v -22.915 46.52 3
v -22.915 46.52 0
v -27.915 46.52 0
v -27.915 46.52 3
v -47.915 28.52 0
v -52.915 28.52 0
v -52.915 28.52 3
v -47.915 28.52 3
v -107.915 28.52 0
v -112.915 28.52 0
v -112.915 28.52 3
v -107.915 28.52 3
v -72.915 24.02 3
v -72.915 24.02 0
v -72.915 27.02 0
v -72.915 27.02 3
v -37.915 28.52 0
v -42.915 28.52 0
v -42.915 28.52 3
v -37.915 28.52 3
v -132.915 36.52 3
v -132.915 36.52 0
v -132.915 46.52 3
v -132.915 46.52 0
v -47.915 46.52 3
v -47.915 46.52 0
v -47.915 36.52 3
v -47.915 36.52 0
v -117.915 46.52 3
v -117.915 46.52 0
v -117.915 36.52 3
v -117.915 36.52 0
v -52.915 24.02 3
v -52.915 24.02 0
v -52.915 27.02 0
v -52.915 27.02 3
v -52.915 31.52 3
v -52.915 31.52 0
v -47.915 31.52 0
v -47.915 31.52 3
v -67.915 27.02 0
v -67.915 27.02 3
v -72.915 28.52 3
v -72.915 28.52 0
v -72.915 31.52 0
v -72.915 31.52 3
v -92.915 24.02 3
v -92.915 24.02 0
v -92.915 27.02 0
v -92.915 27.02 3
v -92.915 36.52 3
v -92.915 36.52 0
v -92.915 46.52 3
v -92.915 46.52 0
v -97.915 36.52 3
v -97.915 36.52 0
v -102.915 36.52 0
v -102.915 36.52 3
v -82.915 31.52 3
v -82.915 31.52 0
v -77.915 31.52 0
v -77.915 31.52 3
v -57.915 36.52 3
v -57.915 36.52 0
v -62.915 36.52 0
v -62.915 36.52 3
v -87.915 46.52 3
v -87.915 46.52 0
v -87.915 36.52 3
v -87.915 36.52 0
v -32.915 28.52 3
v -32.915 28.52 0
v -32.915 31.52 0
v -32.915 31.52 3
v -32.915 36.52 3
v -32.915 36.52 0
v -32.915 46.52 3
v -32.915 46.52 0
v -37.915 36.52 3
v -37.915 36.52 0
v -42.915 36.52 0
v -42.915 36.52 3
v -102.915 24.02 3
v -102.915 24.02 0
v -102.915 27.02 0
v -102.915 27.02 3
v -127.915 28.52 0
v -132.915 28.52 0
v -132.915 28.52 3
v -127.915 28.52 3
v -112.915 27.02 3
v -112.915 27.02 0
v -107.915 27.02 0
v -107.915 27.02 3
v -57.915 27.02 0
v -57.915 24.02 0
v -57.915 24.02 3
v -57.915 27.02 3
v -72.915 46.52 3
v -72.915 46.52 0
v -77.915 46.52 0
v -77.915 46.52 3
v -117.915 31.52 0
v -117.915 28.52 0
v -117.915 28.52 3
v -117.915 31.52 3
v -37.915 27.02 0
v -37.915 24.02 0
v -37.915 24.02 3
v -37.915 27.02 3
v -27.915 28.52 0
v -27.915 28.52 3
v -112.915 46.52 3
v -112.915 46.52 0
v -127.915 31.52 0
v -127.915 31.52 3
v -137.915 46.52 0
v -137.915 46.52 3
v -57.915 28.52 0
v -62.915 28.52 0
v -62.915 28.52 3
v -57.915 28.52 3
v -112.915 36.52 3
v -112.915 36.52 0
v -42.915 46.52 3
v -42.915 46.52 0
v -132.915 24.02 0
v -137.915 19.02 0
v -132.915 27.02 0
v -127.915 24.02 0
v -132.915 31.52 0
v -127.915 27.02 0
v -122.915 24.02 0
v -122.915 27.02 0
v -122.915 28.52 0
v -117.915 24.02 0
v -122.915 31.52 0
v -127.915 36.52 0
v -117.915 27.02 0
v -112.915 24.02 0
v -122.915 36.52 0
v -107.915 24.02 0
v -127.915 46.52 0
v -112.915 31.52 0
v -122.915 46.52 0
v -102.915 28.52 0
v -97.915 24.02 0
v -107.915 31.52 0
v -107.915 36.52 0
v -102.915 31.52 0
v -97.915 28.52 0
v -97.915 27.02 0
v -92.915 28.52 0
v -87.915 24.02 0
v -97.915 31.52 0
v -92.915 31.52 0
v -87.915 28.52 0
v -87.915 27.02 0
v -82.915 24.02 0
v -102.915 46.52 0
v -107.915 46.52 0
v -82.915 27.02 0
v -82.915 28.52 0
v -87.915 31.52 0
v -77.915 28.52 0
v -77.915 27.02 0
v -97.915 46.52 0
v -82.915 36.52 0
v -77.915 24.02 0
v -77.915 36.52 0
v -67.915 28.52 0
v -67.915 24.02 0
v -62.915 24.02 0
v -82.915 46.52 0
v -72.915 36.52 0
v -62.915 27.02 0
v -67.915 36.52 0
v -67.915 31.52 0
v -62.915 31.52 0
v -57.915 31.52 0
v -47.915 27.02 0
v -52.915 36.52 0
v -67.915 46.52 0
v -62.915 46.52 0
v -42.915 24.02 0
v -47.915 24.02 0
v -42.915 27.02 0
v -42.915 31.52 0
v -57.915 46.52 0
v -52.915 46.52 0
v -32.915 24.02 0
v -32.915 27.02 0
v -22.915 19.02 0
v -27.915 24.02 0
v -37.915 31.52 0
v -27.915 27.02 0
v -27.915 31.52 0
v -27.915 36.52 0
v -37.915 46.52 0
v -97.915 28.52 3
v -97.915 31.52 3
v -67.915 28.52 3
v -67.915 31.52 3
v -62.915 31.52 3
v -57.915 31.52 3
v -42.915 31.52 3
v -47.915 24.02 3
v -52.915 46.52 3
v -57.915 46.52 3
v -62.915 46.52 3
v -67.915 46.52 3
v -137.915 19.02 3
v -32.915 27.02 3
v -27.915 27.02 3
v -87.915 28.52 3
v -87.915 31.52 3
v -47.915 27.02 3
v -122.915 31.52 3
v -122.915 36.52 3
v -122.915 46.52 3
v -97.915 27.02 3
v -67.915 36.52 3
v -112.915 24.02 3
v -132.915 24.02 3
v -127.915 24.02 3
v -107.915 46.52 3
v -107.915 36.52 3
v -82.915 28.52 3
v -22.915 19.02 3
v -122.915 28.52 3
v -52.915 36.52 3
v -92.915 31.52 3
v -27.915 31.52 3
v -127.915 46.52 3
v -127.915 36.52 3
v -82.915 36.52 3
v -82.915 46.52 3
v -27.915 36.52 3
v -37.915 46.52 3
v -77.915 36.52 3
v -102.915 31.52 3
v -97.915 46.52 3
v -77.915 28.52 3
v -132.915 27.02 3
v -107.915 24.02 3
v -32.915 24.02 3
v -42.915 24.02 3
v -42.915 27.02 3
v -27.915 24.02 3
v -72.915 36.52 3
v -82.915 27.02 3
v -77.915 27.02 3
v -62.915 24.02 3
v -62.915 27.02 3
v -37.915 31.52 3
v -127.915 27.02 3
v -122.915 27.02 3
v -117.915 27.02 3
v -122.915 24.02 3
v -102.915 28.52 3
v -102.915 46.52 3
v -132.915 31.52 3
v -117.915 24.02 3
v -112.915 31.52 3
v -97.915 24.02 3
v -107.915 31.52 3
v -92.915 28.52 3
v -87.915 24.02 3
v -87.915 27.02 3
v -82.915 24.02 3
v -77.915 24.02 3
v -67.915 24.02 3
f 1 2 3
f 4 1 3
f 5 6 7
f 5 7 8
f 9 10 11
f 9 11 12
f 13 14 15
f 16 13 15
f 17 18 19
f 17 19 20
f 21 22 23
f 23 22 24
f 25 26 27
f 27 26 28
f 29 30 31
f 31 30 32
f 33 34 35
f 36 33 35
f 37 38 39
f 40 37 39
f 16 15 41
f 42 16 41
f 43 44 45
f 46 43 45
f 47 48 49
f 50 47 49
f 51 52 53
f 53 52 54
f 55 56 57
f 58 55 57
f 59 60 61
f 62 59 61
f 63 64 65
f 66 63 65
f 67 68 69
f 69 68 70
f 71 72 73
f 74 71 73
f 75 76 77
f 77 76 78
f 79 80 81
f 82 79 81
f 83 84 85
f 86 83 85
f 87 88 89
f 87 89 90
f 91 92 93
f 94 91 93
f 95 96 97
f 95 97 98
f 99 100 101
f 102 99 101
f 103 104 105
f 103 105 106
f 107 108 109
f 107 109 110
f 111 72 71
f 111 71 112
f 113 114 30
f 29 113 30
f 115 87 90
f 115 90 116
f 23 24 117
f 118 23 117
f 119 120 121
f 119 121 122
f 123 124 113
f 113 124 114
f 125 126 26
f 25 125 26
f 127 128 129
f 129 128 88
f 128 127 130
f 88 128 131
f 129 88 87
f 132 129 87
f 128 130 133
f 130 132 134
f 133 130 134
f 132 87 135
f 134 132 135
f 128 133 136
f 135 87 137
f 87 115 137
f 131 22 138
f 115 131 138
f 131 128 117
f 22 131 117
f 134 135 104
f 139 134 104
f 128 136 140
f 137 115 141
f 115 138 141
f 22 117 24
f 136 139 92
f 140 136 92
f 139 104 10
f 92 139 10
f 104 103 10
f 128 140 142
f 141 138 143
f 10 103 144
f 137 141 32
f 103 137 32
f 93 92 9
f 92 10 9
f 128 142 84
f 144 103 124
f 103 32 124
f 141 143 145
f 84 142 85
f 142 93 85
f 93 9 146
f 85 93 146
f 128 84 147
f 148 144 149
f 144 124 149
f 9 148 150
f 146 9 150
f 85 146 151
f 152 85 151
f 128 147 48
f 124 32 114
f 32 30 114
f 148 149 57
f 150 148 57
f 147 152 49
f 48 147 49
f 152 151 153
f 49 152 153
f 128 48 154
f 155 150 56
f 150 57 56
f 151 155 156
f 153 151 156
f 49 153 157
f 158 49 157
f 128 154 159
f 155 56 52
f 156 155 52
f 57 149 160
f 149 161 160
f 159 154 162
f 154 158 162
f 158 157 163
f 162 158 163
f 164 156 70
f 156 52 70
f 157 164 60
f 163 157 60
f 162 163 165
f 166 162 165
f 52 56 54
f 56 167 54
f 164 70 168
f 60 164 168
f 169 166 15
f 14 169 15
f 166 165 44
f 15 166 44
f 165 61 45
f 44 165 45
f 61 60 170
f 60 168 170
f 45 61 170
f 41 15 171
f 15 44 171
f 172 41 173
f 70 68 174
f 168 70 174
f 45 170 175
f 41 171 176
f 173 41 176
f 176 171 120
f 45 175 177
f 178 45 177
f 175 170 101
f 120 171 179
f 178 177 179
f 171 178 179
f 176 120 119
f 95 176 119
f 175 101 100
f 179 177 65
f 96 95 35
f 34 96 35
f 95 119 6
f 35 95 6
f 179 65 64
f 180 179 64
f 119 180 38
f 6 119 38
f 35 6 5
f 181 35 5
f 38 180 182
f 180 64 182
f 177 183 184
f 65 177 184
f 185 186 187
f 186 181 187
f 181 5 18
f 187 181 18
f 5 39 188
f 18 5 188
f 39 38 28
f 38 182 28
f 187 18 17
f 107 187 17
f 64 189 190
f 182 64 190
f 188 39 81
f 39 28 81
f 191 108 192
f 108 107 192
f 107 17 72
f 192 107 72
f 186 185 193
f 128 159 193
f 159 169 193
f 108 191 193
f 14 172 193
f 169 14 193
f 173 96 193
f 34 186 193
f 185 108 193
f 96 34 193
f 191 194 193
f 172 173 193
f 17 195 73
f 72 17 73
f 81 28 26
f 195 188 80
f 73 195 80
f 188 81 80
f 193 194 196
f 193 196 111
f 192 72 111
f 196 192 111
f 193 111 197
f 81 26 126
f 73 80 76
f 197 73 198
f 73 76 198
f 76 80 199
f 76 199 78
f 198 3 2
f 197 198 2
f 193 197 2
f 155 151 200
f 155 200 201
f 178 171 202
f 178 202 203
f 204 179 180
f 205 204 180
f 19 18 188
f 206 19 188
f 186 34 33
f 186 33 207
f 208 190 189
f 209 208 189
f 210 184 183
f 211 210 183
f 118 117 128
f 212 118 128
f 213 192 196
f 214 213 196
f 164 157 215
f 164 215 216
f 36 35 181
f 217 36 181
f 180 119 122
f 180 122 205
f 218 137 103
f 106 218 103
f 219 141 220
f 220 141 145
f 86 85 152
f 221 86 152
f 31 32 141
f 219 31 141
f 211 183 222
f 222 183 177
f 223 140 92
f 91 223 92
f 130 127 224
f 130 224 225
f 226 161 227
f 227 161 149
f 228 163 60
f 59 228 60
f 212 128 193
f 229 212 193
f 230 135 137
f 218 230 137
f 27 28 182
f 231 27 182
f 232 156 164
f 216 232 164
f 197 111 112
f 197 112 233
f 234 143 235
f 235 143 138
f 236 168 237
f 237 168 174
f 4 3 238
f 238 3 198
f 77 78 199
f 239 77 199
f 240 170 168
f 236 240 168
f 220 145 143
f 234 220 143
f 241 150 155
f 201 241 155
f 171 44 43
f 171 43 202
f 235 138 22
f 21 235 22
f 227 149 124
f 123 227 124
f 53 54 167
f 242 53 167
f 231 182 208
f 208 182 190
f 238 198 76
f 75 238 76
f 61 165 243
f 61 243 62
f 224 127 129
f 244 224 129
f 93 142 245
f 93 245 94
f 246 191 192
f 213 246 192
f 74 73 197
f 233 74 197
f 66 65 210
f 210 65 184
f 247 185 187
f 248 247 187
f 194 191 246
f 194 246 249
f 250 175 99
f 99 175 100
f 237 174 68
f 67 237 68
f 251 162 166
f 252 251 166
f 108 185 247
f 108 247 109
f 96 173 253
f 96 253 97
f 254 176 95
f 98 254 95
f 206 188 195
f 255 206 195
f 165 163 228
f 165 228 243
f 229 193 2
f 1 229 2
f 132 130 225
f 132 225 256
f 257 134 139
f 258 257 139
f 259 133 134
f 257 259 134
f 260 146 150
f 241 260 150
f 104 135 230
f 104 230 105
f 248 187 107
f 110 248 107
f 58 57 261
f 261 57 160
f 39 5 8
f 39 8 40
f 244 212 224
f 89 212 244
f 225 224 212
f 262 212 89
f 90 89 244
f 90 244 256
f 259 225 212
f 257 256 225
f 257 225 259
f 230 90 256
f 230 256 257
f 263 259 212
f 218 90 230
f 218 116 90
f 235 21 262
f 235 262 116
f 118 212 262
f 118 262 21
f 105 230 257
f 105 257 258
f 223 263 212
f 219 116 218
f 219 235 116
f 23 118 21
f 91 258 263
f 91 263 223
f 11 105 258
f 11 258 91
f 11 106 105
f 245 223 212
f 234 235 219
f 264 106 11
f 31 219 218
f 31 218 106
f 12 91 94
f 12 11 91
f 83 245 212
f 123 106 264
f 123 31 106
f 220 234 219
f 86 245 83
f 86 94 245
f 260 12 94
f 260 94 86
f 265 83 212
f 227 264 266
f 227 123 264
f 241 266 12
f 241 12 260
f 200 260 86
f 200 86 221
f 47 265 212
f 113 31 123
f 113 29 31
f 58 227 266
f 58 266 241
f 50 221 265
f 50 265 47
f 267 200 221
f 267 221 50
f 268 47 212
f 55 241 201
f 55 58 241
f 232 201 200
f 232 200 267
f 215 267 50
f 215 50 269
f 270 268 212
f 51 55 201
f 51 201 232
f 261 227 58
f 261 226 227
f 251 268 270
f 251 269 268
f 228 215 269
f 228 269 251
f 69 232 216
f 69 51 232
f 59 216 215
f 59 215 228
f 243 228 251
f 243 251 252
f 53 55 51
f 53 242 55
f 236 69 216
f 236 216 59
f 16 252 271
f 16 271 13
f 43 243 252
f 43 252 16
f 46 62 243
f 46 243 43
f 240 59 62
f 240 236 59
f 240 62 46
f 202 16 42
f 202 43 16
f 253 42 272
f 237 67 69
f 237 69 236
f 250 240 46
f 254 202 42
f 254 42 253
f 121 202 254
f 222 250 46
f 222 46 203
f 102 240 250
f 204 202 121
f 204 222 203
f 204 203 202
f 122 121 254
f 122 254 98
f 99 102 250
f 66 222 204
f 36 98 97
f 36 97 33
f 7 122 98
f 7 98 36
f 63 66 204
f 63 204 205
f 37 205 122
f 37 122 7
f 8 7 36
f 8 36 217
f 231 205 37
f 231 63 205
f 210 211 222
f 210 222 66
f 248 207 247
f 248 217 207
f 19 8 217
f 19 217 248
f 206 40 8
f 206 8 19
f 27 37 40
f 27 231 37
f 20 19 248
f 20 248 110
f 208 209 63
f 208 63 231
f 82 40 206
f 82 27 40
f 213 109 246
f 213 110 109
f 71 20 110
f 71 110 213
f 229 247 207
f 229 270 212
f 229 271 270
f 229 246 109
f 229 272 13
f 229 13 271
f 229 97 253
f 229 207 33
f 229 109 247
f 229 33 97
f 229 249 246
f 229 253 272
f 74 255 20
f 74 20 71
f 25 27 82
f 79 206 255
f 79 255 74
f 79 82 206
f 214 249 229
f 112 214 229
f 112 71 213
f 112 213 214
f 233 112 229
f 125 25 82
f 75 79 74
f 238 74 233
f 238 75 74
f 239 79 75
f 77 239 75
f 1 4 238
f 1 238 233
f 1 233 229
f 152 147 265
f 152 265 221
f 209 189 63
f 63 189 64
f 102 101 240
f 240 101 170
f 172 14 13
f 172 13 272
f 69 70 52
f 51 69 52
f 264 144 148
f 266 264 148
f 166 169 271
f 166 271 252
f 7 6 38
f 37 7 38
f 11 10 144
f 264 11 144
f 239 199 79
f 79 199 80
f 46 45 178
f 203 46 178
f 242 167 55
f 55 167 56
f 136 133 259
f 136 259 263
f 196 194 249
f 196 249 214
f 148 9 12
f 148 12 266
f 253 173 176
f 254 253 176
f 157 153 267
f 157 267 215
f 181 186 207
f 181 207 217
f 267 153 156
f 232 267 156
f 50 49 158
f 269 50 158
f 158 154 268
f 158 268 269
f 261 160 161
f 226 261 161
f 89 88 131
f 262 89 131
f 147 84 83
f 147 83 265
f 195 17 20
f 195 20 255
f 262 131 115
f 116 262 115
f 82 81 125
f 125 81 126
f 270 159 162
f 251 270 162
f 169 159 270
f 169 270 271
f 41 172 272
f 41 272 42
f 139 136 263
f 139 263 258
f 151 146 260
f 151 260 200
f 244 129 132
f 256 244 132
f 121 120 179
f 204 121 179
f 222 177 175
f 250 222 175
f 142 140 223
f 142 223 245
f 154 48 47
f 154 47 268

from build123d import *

# Parameters (mm, degrees)
ESQUISSE1_W        = 5
ESQUISSE1_H        = 3
BOSS_EXTRU_1_DEPTH = 3


with BuildPart() as part:
    # Esquisse1 → Boss.-Extru.1 (new body)
    with BuildSketch(Plane.XY):
        Polygon((-127.914818772, 46.520106884), (-127.914818772, 36.520106884), (-132.914818772, 36.520106884), (-132.914818772, 46.520106884), (-137.914818772, 46.520106884), (-137.914818772, 19.020106884), (-22.914818772, 19.020106884), (-22.914818772, 46.520106884), (-27.914818772, 46.520106884), (-27.914818772, 36.520106884), (-32.914818772, 36.520106884), (-32.914818772, 46.520106884), (-37.914818772, 46.520106884), (-37.914818772, 36.520106884), (-42.914818772, 36.520106884), (-42.914818772, 46.520106884), (-47.914818772, 46.520106884), (-47.914818772, 36.520106884), (-52.914818772, 36.520106884), (-52.914818772, 46.520106884), (-57.914818772, 46.520106884), (-57.914818772, 36.520106884), (-62.914818772, 36.520106884), (-62.914818772, 46.520106884), (-67.914818772, 46.520106884), (-67.914818772, 36.520106884), (-72.914818772, 36.520106884), (-72.914818772, 46.520106884), (-77.914818772, 46.520106884), (-77.914818772, 36.520106884), (-82.914818772, 36.520106884), (-82.914818772, 46.520106884), (-87.914818772, 46.520106884), (-87.914818772, 36.520106884), (-92.914818772, 36.520106884), (-92.914818772, 46.520106884), (-97.914818772, 46.520106884), (-97.914818772, 36.520106884), (-102.914818772, 36.520106884), (-102.914818772, 46.520106884), (-107.914818772, 46.520106884), (-107.914818772, 36.520106884), (-112.914818772, 36.520106884), (-112.914818772, 46.520106884), (-117.914818772, 46.520106884), (-117.914818772, 36.520106884), (-122.914818772, 36.520106884), (-122.914818772, 46.520106884), align=None)
        with Locations((-30.414818772, 30.020106884)):
            Rectangle(ESQUISSE1_W, ESQUISSE1_H, mode=Mode.SUBTRACT)
        with Locations((-40.414818772, 30.020106884)):
            Rectangle(ESQUISSE1_W, ESQUISSE1_H, mode=Mode.SUBTRACT)
        with Locations((-50.414818772, 30.020106884)):
            Rectangle(ESQUISSE1_W, ESQUISSE1_H, mode=Mode.SUBTRACT)
        with Locations((-60.414818772, 30.020106884)):
            Rectangle(ESQUISSE1_W, ESQUISSE1_H, mode=Mode.SUBTRACT)
        with Locations((-70.414818772, 30.020106884)):
            Rectangle(ESQUISSE1_W, ESQUISSE1_H, mode=Mode.SUBTRACT)
        with Locations((-80.414818772, 30.020106884)):
            Rectangle(ESQUISSE1_W, ESQUISSE1_H, mode=Mode.SUBTRACT)
        with Locations((-90.414818772, 30.020106884)):
            Rectangle(ESQUISSE1_W, ESQUISSE1_H, mode=Mode.SUBTRACT)
        with Locations((-100.414818772, 30.020106884)):
            Rectangle(ESQUISSE1_W, ESQUISSE1_H, mode=Mode.SUBTRACT)
        with Locations((-30.414818772, 25.520106884)):
            Rectangle(ESQUISSE1_W, ESQUISSE1_H, mode=Mode.SUBTRACT)
        with Locations((-40.414818772, 25.520106884)):
            Rectangle(ESQUISSE1_W, ESQUISSE1_H, mode=Mode.SUBTRACT)
        with Locations((-50.414818772, 25.520106884)):
            Rectangle(ESQUISSE1_W, ESQUISSE1_H, mode=Mode.SUBTRACT)
        with Locations((-60.414818772, 25.520106884)):
            Rectangle(ESQUISSE1_W, ESQUISSE1_H, mode=Mode.SUBTRACT)
        with Locations((-70.414818772, 25.520106884)):
            Rectangle(ESQUISSE1_W, ESQUISSE1_H, mode=Mode.SUBTRACT)
        with Locations((-80.414818772, 25.520106884)):
            Rectangle(ESQUISSE1_W, ESQUISSE1_H, mode=Mode.SUBTRACT)
        with Locations((-90.414818772, 25.520106884)):
            Rectangle(ESQUISSE1_W, ESQUISSE1_H, mode=Mode.SUBTRACT)
        with Locations((-100.414818772, 25.520106884)):
            Rectangle(ESQUISSE1_W, ESQUISSE1_H, mode=Mode.SUBTRACT)
        with Locations((-110.414818772, 25.520106884)):
            Rectangle(ESQUISSE1_W, ESQUISSE1_H, mode=Mode.SUBTRACT)
        with Locations((-120.414818772, 25.520106884)):
            Rectangle(ESQUISSE1_W, ESQUISSE1_H, mode=Mode.SUBTRACT)
        with Locations((-110.414818772, 30.020106884)):
            Rectangle(ESQUISSE1_W, ESQUISSE1_H, mode=Mode.SUBTRACT)
        with Locations((-130.414818772, 25.520106884)):
            Rectangle(ESQUISSE1_W, ESQUISSE1_H, mode=Mode.SUBTRACT)
        with Locations((-120.414818772, 30.020106884)):
            Rectangle(ESQUISSE1_W, ESQUISSE1_H, mode=Mode.SUBTRACT)
        with Locations((-130.414818772, 30.020106884)):
            Rectangle(ESQUISSE1_W, ESQUISSE1_H, mode=Mode.SUBTRACT)
    extrude(amount=BOSS_EXTRU_1_DEPTH)


solid = part.part
